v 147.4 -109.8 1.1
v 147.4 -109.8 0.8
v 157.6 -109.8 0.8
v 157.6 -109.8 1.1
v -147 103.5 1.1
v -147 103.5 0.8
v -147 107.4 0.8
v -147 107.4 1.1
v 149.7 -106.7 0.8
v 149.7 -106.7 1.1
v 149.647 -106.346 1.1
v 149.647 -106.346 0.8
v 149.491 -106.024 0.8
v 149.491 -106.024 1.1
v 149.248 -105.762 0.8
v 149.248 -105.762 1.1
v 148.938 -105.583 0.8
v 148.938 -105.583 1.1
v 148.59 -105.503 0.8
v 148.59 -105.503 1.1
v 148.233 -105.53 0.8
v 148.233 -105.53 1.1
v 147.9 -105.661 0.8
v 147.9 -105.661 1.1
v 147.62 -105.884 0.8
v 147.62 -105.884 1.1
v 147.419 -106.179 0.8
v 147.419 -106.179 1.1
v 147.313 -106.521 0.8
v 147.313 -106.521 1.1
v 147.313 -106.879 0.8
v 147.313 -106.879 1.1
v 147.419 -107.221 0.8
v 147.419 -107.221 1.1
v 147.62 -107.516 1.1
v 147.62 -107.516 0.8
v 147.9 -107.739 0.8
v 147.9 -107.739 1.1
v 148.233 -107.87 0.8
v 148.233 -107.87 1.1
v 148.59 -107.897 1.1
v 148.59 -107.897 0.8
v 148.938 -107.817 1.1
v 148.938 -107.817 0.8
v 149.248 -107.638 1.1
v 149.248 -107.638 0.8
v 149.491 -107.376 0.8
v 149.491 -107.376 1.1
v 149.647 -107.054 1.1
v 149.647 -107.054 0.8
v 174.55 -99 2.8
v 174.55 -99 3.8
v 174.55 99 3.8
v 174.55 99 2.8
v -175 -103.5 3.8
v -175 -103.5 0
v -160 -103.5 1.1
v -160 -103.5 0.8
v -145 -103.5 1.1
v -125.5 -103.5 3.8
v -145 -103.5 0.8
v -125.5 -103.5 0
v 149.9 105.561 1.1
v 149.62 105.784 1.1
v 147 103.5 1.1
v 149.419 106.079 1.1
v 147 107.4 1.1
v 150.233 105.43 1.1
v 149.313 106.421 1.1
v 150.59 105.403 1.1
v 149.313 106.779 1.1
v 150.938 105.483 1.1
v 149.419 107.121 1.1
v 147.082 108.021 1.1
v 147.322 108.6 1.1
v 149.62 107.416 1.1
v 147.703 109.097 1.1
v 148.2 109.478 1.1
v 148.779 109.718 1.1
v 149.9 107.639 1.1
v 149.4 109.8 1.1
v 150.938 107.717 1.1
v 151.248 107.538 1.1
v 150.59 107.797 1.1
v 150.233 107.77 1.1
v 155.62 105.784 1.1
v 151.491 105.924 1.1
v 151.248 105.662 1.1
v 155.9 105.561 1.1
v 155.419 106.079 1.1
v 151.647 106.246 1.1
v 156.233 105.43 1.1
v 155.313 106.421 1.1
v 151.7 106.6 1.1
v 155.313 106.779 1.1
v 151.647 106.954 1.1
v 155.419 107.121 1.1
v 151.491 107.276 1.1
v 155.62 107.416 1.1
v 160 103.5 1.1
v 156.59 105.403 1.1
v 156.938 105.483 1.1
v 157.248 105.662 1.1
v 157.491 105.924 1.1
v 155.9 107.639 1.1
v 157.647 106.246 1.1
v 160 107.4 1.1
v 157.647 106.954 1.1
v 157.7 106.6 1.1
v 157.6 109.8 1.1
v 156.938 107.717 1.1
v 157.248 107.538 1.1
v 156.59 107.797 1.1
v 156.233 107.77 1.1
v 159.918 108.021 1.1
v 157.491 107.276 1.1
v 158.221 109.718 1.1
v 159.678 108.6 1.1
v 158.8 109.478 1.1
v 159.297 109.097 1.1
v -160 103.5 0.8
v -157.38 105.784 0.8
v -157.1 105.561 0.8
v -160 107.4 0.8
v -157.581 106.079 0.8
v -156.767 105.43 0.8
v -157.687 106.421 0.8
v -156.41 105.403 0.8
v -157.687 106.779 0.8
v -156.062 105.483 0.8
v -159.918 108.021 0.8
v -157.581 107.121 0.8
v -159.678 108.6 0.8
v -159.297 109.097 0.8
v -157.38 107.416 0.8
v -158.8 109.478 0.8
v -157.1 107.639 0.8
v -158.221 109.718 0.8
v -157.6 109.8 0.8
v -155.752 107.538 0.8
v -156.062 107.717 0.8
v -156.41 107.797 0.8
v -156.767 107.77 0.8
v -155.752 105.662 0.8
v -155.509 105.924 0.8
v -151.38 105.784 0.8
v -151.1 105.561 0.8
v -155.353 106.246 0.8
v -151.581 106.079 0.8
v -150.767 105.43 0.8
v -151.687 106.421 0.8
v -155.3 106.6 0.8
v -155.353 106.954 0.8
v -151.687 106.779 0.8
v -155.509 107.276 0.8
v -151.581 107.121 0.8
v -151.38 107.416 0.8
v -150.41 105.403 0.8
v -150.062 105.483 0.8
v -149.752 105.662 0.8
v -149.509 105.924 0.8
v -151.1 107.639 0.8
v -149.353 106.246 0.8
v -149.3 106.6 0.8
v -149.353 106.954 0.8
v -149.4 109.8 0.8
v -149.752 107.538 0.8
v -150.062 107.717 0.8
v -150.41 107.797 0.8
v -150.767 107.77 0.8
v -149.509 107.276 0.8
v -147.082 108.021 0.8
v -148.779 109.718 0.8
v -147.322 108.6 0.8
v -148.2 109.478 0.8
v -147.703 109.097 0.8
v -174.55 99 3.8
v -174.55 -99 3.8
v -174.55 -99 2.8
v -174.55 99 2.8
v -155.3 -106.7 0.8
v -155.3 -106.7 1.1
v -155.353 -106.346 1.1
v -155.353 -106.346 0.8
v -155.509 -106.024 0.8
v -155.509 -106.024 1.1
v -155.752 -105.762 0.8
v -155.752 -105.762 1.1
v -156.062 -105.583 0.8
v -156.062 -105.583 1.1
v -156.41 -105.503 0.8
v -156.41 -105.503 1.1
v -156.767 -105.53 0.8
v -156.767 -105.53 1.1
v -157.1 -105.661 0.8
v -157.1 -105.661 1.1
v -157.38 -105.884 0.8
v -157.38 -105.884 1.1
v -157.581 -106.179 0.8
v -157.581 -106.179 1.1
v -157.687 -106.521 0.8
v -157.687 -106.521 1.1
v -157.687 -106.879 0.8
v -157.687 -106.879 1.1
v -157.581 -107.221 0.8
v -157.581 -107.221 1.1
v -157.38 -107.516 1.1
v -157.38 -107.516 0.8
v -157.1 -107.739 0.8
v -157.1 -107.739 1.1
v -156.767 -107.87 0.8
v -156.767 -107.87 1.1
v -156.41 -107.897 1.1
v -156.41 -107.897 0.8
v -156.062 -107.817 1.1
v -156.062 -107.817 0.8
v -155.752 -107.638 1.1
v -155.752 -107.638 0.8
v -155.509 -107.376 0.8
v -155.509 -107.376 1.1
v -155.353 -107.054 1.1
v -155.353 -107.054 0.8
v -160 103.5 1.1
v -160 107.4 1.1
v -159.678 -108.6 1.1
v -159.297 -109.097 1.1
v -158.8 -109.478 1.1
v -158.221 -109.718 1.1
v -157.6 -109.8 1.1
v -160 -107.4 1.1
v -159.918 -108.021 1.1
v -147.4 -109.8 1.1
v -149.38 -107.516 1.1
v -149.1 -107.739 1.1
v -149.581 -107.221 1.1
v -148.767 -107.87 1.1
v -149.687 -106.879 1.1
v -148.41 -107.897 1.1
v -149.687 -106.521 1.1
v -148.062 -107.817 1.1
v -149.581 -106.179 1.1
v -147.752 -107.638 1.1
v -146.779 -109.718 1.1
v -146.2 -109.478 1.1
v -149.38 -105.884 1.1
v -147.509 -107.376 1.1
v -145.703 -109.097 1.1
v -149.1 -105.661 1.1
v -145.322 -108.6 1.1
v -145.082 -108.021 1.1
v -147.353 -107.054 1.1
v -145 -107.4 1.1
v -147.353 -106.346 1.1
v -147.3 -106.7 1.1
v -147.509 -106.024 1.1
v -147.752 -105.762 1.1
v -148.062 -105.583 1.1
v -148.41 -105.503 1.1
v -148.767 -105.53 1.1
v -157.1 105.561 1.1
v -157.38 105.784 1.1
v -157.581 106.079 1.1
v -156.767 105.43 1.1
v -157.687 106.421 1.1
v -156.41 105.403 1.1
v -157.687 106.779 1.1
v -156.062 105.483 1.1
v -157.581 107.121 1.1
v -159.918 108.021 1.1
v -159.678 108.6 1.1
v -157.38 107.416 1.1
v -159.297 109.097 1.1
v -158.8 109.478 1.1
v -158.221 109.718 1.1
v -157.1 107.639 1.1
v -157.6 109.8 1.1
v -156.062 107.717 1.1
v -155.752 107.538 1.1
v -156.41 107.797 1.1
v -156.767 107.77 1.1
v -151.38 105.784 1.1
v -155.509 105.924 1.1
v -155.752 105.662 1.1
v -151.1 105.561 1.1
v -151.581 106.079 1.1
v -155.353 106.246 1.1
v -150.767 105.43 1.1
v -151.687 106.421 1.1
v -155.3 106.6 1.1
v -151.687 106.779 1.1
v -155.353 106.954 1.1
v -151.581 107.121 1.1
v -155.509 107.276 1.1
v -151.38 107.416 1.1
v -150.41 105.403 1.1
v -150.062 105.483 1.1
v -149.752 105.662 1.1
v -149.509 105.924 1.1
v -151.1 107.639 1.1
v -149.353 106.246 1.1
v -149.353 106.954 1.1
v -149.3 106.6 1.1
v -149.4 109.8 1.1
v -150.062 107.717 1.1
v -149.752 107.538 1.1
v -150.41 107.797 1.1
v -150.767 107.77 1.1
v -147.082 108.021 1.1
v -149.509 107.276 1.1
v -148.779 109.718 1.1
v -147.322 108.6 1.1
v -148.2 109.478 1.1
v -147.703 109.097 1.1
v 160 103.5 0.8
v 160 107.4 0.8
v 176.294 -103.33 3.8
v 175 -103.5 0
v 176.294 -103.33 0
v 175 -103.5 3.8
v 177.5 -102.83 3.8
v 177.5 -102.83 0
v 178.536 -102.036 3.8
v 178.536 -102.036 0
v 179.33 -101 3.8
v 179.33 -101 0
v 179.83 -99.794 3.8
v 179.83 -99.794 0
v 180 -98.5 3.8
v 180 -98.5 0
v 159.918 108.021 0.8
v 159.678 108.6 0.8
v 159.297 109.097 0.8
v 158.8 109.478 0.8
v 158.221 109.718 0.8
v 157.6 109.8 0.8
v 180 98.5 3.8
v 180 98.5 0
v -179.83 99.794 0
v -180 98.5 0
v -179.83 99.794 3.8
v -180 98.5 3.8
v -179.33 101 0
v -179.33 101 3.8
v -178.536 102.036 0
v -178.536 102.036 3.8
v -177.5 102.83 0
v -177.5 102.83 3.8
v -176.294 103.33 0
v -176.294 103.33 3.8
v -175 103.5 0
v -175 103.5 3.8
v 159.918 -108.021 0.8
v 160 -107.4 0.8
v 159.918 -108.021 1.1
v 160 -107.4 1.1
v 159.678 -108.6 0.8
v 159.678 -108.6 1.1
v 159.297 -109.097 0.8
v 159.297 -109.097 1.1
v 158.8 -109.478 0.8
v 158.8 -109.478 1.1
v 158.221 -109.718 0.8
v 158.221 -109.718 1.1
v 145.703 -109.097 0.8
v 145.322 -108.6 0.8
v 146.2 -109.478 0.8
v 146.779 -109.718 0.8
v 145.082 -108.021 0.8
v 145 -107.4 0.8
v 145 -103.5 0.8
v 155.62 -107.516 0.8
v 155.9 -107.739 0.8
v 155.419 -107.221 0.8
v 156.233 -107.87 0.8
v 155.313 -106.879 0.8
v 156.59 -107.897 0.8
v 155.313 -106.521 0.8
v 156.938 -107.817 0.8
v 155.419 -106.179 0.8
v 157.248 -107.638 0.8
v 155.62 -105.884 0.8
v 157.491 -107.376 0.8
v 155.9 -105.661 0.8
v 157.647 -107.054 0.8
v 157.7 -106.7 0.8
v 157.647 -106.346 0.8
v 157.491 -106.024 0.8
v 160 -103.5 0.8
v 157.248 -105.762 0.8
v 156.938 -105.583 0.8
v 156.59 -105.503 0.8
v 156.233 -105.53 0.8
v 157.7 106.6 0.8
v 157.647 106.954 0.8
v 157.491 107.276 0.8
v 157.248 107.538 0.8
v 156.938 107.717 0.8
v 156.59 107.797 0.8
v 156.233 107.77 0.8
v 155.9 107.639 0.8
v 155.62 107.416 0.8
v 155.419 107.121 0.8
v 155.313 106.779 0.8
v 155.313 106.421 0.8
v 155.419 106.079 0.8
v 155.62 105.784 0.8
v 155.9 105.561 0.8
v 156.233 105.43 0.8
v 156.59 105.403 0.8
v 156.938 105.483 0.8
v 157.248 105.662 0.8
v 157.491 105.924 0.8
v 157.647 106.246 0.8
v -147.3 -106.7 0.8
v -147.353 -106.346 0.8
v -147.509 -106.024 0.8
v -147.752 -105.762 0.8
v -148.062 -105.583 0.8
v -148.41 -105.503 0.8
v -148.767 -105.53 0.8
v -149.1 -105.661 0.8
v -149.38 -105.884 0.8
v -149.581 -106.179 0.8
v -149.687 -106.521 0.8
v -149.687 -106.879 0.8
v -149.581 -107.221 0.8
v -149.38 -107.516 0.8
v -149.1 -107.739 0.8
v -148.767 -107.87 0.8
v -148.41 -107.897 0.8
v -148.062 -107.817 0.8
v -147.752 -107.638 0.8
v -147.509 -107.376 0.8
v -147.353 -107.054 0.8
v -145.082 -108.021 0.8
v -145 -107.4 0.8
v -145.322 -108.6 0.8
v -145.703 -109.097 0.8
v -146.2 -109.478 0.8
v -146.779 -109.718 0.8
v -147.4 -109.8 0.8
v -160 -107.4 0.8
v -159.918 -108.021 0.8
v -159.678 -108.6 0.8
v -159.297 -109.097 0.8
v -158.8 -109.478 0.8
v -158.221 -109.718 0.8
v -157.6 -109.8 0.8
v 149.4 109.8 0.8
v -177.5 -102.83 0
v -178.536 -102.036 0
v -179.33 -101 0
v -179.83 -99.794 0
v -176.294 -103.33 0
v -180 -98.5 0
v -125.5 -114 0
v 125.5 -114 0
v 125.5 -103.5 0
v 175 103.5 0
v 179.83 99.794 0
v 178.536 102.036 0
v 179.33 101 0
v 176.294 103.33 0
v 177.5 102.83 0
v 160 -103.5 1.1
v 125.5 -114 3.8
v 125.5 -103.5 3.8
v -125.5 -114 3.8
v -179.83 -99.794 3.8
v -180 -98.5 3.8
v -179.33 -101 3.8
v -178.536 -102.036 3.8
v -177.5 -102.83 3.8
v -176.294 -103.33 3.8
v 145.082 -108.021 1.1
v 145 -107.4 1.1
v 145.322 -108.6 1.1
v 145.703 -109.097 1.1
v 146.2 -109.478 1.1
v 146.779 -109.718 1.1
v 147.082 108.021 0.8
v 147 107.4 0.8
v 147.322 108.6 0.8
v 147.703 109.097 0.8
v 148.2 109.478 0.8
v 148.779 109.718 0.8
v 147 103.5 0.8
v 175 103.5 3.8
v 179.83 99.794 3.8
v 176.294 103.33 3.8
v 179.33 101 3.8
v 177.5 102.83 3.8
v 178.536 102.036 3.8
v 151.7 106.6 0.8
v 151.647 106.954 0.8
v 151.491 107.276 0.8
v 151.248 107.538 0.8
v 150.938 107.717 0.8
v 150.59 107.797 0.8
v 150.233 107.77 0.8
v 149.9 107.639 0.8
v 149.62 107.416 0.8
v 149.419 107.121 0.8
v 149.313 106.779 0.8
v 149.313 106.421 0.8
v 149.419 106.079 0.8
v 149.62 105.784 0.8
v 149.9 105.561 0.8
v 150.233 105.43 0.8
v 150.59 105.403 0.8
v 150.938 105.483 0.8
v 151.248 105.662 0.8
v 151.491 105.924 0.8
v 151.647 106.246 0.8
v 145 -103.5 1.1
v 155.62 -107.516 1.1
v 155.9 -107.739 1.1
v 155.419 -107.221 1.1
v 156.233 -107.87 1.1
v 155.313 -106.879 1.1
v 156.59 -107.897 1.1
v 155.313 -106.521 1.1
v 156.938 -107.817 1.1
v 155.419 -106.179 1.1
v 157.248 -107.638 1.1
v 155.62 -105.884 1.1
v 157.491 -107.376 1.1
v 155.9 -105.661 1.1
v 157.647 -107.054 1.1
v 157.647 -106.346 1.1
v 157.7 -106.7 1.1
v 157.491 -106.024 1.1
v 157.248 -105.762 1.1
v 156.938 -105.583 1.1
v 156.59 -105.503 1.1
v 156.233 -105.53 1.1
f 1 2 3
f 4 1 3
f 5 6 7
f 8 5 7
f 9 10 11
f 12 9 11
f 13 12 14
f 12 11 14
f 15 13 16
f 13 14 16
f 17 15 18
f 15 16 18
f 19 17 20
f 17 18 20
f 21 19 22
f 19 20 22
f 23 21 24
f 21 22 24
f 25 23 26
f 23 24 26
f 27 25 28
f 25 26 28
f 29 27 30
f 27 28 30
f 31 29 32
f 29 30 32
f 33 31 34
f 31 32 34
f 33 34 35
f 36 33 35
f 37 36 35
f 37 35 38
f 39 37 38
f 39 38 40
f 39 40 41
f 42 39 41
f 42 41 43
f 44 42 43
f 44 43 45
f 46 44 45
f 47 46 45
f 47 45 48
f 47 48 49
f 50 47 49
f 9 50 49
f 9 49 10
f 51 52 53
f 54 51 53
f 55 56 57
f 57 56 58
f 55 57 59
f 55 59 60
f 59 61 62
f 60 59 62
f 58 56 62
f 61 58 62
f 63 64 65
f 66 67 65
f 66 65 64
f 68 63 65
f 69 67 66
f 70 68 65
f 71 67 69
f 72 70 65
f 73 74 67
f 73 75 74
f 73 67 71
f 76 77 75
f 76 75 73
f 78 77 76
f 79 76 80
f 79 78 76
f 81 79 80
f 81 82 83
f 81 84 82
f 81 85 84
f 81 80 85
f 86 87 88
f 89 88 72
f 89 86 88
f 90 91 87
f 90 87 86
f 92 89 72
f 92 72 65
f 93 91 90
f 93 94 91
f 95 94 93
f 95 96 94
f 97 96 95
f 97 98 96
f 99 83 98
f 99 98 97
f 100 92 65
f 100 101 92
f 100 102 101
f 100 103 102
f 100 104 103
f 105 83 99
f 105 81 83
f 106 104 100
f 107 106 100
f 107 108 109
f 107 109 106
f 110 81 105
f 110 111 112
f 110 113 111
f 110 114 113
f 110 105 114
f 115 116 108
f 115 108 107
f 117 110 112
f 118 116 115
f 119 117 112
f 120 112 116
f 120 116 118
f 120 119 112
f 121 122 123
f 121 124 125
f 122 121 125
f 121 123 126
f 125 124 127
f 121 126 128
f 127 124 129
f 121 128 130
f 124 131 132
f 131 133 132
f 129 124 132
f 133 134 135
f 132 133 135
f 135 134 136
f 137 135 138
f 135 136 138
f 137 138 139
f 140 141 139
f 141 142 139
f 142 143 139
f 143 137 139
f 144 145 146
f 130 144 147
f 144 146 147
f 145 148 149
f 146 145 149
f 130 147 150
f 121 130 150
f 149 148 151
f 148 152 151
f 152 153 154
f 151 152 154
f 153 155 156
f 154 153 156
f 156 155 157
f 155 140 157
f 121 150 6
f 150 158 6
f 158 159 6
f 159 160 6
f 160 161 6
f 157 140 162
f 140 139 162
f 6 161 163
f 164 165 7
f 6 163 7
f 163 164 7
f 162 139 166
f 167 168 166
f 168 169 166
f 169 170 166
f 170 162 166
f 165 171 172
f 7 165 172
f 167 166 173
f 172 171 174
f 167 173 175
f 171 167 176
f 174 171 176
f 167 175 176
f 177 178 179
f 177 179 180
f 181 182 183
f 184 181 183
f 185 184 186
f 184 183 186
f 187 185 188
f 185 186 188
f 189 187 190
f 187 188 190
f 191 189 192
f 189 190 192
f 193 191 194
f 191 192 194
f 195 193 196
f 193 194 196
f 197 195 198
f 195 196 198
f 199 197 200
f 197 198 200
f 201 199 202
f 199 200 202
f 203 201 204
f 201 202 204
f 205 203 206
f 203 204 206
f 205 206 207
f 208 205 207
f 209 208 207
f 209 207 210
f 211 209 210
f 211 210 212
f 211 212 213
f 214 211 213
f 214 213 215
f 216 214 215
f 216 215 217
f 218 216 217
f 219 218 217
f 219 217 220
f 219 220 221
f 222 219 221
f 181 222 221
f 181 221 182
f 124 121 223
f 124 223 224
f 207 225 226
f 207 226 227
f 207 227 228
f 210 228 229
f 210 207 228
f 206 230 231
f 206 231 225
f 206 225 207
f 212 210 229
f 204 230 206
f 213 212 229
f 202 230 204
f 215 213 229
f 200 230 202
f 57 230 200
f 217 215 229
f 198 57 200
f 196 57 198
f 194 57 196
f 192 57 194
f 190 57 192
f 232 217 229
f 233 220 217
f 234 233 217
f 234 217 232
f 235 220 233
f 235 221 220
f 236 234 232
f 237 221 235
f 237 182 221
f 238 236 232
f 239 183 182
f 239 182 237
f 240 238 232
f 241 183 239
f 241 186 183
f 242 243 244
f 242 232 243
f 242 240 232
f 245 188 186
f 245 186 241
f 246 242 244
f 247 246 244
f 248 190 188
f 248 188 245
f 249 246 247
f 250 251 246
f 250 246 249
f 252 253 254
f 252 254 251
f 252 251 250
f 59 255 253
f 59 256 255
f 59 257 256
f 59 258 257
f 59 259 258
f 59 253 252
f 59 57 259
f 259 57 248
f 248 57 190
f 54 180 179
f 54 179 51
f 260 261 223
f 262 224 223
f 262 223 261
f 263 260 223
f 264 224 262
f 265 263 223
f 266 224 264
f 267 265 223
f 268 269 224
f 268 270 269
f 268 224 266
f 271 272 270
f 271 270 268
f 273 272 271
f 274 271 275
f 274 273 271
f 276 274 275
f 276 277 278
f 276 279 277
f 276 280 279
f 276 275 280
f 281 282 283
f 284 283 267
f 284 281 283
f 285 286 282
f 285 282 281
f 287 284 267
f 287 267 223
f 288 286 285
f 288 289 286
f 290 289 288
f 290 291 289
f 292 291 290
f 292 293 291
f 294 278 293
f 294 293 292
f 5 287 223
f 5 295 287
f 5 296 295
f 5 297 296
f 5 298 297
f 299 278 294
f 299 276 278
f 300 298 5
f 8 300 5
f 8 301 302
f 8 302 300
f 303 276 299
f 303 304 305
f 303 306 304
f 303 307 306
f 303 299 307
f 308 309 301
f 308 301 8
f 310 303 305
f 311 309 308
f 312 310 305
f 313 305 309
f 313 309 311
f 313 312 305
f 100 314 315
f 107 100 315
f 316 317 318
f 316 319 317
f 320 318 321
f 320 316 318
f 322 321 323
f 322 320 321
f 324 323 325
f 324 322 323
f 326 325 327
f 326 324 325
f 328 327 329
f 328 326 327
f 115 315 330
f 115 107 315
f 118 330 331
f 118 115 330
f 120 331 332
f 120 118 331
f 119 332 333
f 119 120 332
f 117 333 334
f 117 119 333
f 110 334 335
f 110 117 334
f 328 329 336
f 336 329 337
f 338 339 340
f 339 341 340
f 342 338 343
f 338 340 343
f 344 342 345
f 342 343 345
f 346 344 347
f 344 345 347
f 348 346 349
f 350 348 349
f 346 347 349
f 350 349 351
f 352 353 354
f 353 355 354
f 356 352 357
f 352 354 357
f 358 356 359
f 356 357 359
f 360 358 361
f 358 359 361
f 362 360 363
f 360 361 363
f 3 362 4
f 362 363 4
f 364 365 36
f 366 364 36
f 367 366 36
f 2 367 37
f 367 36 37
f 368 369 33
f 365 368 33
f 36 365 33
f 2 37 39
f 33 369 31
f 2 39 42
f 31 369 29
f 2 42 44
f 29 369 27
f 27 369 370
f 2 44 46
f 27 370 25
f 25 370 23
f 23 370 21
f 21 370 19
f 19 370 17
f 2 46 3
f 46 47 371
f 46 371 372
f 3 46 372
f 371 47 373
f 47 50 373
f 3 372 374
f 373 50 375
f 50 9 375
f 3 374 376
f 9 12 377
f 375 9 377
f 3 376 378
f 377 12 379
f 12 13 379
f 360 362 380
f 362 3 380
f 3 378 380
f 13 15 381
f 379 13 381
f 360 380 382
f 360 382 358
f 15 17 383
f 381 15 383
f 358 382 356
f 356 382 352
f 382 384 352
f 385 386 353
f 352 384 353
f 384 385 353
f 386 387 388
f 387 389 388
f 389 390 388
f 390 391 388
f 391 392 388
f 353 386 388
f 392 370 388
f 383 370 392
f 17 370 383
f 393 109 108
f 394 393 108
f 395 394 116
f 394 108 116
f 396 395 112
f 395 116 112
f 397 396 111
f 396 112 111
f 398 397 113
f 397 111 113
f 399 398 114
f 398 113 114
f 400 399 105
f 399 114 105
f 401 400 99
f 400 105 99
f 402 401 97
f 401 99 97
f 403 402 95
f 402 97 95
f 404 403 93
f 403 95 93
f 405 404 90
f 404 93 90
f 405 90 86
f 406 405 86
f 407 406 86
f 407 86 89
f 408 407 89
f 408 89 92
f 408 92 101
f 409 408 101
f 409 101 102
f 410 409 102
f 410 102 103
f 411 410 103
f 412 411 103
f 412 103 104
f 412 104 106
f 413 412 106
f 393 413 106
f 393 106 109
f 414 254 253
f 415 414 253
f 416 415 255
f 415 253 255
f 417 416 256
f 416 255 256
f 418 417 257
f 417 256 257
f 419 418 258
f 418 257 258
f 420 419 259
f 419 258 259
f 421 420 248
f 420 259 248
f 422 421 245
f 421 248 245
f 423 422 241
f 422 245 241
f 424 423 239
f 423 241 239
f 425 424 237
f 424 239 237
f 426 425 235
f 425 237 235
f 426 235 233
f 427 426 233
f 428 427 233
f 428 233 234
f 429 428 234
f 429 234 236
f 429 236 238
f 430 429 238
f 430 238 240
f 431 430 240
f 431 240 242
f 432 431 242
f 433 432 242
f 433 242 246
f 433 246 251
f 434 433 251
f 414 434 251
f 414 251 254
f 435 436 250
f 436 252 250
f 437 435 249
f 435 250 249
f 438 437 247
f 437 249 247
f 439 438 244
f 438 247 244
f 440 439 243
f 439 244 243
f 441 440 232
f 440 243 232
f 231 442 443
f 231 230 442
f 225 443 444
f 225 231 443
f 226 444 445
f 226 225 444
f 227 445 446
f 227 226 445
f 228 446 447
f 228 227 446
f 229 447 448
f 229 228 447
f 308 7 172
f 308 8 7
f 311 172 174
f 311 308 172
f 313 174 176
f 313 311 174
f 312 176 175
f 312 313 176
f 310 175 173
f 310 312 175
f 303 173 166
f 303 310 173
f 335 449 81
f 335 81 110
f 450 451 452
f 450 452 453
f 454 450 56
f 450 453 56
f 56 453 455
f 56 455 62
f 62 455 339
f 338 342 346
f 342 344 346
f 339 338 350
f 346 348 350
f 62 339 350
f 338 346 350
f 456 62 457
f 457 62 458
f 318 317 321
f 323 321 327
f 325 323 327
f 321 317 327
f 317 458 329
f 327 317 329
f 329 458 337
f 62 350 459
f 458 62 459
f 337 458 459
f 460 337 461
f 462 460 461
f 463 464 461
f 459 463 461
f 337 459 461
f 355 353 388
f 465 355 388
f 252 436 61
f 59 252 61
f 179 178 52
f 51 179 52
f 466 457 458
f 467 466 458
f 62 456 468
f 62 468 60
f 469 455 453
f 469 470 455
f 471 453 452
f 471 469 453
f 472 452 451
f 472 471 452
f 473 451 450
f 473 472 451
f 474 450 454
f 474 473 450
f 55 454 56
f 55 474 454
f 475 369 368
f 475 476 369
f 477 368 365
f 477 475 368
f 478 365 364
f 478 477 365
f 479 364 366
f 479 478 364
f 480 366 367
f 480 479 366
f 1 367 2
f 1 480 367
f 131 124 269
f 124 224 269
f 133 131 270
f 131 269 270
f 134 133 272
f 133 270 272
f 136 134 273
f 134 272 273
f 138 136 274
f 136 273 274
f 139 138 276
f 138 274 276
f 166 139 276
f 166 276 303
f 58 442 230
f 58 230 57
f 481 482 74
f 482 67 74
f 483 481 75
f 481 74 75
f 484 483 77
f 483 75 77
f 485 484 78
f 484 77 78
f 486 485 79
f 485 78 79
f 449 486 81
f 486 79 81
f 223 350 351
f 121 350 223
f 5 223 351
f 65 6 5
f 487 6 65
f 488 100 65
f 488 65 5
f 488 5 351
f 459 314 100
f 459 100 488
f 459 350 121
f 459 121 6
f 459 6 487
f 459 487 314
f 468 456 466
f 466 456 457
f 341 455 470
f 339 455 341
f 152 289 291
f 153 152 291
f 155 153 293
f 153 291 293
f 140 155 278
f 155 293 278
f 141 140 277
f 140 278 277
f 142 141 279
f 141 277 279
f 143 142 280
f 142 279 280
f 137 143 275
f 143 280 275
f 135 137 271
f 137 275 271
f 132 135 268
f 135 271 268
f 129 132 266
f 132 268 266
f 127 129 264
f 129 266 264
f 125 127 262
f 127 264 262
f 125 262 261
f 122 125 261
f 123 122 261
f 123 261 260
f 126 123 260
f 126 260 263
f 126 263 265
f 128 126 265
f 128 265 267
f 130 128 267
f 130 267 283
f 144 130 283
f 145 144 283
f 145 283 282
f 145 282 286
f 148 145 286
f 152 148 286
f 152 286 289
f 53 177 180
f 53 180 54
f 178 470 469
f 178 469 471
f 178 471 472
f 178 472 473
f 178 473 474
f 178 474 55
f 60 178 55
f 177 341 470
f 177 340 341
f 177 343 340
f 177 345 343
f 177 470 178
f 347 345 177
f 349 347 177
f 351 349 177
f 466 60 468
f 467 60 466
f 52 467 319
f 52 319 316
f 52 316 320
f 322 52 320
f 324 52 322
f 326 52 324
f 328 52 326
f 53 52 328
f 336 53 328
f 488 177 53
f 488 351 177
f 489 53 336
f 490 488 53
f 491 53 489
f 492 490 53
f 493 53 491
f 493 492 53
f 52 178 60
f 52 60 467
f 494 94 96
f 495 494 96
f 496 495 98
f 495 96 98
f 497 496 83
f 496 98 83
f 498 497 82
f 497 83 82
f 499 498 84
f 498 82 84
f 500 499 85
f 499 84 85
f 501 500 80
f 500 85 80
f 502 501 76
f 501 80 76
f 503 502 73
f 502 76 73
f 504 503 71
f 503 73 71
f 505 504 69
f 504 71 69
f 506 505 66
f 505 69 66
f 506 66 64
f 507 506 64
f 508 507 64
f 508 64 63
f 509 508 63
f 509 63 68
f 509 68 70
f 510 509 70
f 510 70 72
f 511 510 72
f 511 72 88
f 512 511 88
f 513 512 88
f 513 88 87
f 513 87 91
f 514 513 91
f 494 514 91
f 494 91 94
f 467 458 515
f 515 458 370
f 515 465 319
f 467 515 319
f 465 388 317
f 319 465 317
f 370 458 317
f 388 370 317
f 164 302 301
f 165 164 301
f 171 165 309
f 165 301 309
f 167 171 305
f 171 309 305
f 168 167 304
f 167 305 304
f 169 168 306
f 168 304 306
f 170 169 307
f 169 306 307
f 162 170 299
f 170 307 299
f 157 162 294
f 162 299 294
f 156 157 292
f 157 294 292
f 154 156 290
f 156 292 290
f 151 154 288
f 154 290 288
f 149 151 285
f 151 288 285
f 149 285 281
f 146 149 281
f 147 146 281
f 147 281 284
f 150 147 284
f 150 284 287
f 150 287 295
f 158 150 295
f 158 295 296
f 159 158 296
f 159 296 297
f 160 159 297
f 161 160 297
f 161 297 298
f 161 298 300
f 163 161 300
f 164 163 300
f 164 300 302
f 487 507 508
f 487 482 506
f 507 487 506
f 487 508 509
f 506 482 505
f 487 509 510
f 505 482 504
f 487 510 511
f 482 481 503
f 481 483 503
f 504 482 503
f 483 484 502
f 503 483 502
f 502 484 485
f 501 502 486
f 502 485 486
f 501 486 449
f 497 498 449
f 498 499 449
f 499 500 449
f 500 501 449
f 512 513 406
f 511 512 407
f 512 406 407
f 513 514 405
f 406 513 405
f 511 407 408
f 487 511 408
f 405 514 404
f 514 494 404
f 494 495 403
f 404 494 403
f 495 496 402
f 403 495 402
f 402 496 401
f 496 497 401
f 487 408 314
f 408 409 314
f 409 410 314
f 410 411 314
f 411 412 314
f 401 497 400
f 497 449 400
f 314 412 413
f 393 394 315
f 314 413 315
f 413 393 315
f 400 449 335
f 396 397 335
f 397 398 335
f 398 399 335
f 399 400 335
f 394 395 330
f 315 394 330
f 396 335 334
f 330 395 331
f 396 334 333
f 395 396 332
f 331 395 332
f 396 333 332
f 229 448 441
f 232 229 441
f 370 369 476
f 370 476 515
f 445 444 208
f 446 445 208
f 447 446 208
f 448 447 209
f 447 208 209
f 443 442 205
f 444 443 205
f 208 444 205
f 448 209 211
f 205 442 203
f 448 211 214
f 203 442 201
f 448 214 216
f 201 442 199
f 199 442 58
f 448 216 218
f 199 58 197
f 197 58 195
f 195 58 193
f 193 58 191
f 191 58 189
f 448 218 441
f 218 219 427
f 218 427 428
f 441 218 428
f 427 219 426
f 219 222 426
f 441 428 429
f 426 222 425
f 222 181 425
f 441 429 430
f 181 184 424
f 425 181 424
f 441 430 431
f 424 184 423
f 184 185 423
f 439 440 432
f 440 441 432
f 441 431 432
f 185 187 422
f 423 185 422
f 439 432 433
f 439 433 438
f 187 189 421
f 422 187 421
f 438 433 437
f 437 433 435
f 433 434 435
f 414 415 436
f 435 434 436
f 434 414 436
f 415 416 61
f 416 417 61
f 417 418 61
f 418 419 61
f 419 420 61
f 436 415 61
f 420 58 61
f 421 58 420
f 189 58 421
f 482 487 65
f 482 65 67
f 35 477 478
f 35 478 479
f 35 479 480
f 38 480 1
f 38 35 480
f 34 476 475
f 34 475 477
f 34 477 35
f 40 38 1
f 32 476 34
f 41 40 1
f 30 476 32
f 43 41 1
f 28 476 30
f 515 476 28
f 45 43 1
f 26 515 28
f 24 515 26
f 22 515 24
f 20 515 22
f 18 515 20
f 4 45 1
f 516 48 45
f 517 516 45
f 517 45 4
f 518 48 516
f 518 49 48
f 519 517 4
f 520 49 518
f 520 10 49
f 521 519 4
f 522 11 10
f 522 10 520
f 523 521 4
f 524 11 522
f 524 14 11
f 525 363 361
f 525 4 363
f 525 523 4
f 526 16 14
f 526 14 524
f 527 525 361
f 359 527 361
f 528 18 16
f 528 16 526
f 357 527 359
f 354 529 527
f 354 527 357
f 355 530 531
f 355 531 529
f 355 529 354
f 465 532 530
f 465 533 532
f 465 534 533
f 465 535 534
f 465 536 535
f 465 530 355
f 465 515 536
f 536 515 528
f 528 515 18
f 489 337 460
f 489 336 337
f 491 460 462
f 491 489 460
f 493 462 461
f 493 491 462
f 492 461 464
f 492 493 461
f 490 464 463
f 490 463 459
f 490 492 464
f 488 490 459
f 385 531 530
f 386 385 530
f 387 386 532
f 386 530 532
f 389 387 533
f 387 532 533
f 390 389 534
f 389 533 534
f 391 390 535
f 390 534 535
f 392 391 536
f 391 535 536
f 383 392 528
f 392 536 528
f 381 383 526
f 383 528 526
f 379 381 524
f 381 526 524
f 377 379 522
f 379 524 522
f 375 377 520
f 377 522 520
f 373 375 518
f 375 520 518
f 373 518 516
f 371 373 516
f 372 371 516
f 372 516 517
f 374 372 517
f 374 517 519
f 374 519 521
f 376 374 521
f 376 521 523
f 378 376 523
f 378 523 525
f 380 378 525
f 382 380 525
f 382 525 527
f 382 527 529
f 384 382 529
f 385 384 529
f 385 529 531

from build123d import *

# Parameters (mm, degrees)
F0_W      = 360
F0_H      = 207
F1_DEPTH  = 3.8
F2_R      = 5
F3_W      = 349.1
F3_H      = 198
F4_DEPTH  = 1
F6_W      = 13
F6_H      = 6.3
F6_W_2    = 15
F7_DEPTH  = 0.3
F8_R      = 2.4
F9_R      = 1.2
F10_DEPTH = 1.101
F11_W     = 251
F11_H     = 10.5
F12_DEPTH = 3.8


with BuildPart() as f1:
    # F0 (on Top) → F1 (new body)
    with BuildSketch(Plane.XY):
        Rectangle(F0_W, F0_H)
    extrude(amount=F1_DEPTH)

    # F2
    f2_edges = [f1.edges().sort_by_distance(p)[0] for p in [
        (180, 103.5, 1.9),
        (-180, 103.5, 1.9),
        (-180, -103.5, 1.9),
        (180, -103.5, 1.9),
    ]]
    fillet(f2_edges, radius=F2_R)

    # F3 (on face) → F4 (cut)
    with BuildSketch(Plane.XY.offset(3.8)):
        Rectangle(F3_W, F3_H)
    extrude(amount=-F4_DEPTH, mode=Mode.SUBTRACT)

    # F6 (on offset) → F7 (join)
    with BuildSketch(Plane.XY.offset(0.8)):
        with Locations((-153.5, 106.65)):
            Rectangle(F6_W, F6_H)
        with Locations((153.5, 106.65)):
            Rectangle(F6_W, F6_H)
        with Locations((-152.5, -106.65)):
            Rectangle(F6_W_2, F6_H)
        with Locations((152.5, -106.65)):
            Rectangle(F6_W_2, F6_H)
    extrude(amount=F7_DEPTH)

    # F8
    f8_edges = [f1.edges().sort_by_distance(p)[0] for p in [
        (-160, 109.8, 0.95),
        (-147, 109.8, 0.95),
        (147, 109.8, 0.95),
        (160, 109.8, 0.95),
        (145, -109.8, 0.95),
        (160, -109.8, 0.95),
        (-160, -109.8, 0.95),
        (-145, -109.8, 0.95),
    ]]
    fillet(f8_edges, radius=F8_R)

    # F9 (on face) → F10 (cut, through all)
    with BuildSketch(Plane.XY.offset(1.1)):
        with Locations((-156.5, 106.6)):
            Circle(F9_R)
        with Locations((-150.5, 106.6)):
            Circle(F9_R)
        with Locations((150.5, 106.6)):
            Circle(F9_R)
        with Locations((156.5, 106.6)):
            Circle(F9_R)
        with Locations((148.5, -106.7)):
            Circle(F9_R)
        with Locations((156.5, -106.7)):
            Circle(F9_R)
        with Locations((-156.5, -106.7)):
            Circle(F9_R)
        with Locations((-148.5, -106.7)):
            Circle(F9_R)
    extrude(amount=-F10_DEPTH, mode=Mode.SUBTRACT)

    # F11 (on Top) → F12 (join)
    with BuildSketch(Plane.XY):
        with Locations((0, -108.75)):
            Rectangle(F11_W, F11_H)
    extrude(amount=F12_DEPTH)


solid = f1.part
